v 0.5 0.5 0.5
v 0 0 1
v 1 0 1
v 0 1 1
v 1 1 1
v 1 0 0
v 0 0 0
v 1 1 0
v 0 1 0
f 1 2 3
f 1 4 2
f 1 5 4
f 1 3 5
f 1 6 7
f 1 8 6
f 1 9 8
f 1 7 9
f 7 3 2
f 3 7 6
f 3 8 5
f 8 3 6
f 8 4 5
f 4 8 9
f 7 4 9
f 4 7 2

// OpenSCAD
polyhedron(
  points=[
    [0, 0, 0],
    [1, 0, 0],
    [0, 1, 0],
    [1, 1, 0],

    [0, 0, 1],
    [1, 0, 1],
    [0, 1, 1],
    [1, 1, 1],

    [0.5, 0.5, 0.5],
    [0.5, 0.5, 0.5],
  ],
  faces=[
    [5,4,9],
    [4,6,9],
    [6,7,9],
    [7,5,9],
    
    [0,1,8],
    [1,3,8],
    [3,2,8],
    [2,0,8],
    
    [4,5,1,0],
    [5,7,3,1],
    [7,6,2,3],
    [6,4,0,2],
  ]);
